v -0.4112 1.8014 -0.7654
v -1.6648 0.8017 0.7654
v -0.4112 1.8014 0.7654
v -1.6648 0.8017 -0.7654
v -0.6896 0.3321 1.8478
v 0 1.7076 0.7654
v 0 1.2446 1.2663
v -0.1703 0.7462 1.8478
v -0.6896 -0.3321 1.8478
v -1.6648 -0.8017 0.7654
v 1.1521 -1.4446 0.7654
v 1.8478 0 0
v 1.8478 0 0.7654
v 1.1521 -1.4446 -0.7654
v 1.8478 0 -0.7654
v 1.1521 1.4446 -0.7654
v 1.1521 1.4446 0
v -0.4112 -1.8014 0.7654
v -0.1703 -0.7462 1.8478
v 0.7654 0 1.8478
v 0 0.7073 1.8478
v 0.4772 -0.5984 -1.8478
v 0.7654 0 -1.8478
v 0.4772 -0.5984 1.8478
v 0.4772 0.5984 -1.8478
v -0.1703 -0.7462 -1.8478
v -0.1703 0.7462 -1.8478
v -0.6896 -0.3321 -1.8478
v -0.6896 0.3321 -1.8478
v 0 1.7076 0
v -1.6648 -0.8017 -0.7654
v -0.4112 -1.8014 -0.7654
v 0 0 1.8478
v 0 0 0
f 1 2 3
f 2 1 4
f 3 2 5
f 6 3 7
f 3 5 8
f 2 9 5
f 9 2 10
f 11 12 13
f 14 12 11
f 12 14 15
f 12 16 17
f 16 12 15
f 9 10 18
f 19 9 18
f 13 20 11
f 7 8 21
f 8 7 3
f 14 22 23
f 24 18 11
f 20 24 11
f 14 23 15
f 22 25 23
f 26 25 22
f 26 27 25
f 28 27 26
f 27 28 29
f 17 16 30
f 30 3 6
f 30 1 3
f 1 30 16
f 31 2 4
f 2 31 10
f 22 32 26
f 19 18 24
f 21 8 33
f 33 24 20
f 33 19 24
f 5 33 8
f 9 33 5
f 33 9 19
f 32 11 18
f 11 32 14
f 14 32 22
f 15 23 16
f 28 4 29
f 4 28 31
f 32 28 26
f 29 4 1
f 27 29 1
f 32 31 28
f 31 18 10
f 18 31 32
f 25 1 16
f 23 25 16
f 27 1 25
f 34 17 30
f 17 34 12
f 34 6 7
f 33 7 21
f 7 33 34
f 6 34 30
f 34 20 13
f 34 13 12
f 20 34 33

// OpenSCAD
// Generated by generate_scads.py
union() {
  difference() {
    sphere(r=2);
    cube(size=[25,30,10], center=false);
  }
}
